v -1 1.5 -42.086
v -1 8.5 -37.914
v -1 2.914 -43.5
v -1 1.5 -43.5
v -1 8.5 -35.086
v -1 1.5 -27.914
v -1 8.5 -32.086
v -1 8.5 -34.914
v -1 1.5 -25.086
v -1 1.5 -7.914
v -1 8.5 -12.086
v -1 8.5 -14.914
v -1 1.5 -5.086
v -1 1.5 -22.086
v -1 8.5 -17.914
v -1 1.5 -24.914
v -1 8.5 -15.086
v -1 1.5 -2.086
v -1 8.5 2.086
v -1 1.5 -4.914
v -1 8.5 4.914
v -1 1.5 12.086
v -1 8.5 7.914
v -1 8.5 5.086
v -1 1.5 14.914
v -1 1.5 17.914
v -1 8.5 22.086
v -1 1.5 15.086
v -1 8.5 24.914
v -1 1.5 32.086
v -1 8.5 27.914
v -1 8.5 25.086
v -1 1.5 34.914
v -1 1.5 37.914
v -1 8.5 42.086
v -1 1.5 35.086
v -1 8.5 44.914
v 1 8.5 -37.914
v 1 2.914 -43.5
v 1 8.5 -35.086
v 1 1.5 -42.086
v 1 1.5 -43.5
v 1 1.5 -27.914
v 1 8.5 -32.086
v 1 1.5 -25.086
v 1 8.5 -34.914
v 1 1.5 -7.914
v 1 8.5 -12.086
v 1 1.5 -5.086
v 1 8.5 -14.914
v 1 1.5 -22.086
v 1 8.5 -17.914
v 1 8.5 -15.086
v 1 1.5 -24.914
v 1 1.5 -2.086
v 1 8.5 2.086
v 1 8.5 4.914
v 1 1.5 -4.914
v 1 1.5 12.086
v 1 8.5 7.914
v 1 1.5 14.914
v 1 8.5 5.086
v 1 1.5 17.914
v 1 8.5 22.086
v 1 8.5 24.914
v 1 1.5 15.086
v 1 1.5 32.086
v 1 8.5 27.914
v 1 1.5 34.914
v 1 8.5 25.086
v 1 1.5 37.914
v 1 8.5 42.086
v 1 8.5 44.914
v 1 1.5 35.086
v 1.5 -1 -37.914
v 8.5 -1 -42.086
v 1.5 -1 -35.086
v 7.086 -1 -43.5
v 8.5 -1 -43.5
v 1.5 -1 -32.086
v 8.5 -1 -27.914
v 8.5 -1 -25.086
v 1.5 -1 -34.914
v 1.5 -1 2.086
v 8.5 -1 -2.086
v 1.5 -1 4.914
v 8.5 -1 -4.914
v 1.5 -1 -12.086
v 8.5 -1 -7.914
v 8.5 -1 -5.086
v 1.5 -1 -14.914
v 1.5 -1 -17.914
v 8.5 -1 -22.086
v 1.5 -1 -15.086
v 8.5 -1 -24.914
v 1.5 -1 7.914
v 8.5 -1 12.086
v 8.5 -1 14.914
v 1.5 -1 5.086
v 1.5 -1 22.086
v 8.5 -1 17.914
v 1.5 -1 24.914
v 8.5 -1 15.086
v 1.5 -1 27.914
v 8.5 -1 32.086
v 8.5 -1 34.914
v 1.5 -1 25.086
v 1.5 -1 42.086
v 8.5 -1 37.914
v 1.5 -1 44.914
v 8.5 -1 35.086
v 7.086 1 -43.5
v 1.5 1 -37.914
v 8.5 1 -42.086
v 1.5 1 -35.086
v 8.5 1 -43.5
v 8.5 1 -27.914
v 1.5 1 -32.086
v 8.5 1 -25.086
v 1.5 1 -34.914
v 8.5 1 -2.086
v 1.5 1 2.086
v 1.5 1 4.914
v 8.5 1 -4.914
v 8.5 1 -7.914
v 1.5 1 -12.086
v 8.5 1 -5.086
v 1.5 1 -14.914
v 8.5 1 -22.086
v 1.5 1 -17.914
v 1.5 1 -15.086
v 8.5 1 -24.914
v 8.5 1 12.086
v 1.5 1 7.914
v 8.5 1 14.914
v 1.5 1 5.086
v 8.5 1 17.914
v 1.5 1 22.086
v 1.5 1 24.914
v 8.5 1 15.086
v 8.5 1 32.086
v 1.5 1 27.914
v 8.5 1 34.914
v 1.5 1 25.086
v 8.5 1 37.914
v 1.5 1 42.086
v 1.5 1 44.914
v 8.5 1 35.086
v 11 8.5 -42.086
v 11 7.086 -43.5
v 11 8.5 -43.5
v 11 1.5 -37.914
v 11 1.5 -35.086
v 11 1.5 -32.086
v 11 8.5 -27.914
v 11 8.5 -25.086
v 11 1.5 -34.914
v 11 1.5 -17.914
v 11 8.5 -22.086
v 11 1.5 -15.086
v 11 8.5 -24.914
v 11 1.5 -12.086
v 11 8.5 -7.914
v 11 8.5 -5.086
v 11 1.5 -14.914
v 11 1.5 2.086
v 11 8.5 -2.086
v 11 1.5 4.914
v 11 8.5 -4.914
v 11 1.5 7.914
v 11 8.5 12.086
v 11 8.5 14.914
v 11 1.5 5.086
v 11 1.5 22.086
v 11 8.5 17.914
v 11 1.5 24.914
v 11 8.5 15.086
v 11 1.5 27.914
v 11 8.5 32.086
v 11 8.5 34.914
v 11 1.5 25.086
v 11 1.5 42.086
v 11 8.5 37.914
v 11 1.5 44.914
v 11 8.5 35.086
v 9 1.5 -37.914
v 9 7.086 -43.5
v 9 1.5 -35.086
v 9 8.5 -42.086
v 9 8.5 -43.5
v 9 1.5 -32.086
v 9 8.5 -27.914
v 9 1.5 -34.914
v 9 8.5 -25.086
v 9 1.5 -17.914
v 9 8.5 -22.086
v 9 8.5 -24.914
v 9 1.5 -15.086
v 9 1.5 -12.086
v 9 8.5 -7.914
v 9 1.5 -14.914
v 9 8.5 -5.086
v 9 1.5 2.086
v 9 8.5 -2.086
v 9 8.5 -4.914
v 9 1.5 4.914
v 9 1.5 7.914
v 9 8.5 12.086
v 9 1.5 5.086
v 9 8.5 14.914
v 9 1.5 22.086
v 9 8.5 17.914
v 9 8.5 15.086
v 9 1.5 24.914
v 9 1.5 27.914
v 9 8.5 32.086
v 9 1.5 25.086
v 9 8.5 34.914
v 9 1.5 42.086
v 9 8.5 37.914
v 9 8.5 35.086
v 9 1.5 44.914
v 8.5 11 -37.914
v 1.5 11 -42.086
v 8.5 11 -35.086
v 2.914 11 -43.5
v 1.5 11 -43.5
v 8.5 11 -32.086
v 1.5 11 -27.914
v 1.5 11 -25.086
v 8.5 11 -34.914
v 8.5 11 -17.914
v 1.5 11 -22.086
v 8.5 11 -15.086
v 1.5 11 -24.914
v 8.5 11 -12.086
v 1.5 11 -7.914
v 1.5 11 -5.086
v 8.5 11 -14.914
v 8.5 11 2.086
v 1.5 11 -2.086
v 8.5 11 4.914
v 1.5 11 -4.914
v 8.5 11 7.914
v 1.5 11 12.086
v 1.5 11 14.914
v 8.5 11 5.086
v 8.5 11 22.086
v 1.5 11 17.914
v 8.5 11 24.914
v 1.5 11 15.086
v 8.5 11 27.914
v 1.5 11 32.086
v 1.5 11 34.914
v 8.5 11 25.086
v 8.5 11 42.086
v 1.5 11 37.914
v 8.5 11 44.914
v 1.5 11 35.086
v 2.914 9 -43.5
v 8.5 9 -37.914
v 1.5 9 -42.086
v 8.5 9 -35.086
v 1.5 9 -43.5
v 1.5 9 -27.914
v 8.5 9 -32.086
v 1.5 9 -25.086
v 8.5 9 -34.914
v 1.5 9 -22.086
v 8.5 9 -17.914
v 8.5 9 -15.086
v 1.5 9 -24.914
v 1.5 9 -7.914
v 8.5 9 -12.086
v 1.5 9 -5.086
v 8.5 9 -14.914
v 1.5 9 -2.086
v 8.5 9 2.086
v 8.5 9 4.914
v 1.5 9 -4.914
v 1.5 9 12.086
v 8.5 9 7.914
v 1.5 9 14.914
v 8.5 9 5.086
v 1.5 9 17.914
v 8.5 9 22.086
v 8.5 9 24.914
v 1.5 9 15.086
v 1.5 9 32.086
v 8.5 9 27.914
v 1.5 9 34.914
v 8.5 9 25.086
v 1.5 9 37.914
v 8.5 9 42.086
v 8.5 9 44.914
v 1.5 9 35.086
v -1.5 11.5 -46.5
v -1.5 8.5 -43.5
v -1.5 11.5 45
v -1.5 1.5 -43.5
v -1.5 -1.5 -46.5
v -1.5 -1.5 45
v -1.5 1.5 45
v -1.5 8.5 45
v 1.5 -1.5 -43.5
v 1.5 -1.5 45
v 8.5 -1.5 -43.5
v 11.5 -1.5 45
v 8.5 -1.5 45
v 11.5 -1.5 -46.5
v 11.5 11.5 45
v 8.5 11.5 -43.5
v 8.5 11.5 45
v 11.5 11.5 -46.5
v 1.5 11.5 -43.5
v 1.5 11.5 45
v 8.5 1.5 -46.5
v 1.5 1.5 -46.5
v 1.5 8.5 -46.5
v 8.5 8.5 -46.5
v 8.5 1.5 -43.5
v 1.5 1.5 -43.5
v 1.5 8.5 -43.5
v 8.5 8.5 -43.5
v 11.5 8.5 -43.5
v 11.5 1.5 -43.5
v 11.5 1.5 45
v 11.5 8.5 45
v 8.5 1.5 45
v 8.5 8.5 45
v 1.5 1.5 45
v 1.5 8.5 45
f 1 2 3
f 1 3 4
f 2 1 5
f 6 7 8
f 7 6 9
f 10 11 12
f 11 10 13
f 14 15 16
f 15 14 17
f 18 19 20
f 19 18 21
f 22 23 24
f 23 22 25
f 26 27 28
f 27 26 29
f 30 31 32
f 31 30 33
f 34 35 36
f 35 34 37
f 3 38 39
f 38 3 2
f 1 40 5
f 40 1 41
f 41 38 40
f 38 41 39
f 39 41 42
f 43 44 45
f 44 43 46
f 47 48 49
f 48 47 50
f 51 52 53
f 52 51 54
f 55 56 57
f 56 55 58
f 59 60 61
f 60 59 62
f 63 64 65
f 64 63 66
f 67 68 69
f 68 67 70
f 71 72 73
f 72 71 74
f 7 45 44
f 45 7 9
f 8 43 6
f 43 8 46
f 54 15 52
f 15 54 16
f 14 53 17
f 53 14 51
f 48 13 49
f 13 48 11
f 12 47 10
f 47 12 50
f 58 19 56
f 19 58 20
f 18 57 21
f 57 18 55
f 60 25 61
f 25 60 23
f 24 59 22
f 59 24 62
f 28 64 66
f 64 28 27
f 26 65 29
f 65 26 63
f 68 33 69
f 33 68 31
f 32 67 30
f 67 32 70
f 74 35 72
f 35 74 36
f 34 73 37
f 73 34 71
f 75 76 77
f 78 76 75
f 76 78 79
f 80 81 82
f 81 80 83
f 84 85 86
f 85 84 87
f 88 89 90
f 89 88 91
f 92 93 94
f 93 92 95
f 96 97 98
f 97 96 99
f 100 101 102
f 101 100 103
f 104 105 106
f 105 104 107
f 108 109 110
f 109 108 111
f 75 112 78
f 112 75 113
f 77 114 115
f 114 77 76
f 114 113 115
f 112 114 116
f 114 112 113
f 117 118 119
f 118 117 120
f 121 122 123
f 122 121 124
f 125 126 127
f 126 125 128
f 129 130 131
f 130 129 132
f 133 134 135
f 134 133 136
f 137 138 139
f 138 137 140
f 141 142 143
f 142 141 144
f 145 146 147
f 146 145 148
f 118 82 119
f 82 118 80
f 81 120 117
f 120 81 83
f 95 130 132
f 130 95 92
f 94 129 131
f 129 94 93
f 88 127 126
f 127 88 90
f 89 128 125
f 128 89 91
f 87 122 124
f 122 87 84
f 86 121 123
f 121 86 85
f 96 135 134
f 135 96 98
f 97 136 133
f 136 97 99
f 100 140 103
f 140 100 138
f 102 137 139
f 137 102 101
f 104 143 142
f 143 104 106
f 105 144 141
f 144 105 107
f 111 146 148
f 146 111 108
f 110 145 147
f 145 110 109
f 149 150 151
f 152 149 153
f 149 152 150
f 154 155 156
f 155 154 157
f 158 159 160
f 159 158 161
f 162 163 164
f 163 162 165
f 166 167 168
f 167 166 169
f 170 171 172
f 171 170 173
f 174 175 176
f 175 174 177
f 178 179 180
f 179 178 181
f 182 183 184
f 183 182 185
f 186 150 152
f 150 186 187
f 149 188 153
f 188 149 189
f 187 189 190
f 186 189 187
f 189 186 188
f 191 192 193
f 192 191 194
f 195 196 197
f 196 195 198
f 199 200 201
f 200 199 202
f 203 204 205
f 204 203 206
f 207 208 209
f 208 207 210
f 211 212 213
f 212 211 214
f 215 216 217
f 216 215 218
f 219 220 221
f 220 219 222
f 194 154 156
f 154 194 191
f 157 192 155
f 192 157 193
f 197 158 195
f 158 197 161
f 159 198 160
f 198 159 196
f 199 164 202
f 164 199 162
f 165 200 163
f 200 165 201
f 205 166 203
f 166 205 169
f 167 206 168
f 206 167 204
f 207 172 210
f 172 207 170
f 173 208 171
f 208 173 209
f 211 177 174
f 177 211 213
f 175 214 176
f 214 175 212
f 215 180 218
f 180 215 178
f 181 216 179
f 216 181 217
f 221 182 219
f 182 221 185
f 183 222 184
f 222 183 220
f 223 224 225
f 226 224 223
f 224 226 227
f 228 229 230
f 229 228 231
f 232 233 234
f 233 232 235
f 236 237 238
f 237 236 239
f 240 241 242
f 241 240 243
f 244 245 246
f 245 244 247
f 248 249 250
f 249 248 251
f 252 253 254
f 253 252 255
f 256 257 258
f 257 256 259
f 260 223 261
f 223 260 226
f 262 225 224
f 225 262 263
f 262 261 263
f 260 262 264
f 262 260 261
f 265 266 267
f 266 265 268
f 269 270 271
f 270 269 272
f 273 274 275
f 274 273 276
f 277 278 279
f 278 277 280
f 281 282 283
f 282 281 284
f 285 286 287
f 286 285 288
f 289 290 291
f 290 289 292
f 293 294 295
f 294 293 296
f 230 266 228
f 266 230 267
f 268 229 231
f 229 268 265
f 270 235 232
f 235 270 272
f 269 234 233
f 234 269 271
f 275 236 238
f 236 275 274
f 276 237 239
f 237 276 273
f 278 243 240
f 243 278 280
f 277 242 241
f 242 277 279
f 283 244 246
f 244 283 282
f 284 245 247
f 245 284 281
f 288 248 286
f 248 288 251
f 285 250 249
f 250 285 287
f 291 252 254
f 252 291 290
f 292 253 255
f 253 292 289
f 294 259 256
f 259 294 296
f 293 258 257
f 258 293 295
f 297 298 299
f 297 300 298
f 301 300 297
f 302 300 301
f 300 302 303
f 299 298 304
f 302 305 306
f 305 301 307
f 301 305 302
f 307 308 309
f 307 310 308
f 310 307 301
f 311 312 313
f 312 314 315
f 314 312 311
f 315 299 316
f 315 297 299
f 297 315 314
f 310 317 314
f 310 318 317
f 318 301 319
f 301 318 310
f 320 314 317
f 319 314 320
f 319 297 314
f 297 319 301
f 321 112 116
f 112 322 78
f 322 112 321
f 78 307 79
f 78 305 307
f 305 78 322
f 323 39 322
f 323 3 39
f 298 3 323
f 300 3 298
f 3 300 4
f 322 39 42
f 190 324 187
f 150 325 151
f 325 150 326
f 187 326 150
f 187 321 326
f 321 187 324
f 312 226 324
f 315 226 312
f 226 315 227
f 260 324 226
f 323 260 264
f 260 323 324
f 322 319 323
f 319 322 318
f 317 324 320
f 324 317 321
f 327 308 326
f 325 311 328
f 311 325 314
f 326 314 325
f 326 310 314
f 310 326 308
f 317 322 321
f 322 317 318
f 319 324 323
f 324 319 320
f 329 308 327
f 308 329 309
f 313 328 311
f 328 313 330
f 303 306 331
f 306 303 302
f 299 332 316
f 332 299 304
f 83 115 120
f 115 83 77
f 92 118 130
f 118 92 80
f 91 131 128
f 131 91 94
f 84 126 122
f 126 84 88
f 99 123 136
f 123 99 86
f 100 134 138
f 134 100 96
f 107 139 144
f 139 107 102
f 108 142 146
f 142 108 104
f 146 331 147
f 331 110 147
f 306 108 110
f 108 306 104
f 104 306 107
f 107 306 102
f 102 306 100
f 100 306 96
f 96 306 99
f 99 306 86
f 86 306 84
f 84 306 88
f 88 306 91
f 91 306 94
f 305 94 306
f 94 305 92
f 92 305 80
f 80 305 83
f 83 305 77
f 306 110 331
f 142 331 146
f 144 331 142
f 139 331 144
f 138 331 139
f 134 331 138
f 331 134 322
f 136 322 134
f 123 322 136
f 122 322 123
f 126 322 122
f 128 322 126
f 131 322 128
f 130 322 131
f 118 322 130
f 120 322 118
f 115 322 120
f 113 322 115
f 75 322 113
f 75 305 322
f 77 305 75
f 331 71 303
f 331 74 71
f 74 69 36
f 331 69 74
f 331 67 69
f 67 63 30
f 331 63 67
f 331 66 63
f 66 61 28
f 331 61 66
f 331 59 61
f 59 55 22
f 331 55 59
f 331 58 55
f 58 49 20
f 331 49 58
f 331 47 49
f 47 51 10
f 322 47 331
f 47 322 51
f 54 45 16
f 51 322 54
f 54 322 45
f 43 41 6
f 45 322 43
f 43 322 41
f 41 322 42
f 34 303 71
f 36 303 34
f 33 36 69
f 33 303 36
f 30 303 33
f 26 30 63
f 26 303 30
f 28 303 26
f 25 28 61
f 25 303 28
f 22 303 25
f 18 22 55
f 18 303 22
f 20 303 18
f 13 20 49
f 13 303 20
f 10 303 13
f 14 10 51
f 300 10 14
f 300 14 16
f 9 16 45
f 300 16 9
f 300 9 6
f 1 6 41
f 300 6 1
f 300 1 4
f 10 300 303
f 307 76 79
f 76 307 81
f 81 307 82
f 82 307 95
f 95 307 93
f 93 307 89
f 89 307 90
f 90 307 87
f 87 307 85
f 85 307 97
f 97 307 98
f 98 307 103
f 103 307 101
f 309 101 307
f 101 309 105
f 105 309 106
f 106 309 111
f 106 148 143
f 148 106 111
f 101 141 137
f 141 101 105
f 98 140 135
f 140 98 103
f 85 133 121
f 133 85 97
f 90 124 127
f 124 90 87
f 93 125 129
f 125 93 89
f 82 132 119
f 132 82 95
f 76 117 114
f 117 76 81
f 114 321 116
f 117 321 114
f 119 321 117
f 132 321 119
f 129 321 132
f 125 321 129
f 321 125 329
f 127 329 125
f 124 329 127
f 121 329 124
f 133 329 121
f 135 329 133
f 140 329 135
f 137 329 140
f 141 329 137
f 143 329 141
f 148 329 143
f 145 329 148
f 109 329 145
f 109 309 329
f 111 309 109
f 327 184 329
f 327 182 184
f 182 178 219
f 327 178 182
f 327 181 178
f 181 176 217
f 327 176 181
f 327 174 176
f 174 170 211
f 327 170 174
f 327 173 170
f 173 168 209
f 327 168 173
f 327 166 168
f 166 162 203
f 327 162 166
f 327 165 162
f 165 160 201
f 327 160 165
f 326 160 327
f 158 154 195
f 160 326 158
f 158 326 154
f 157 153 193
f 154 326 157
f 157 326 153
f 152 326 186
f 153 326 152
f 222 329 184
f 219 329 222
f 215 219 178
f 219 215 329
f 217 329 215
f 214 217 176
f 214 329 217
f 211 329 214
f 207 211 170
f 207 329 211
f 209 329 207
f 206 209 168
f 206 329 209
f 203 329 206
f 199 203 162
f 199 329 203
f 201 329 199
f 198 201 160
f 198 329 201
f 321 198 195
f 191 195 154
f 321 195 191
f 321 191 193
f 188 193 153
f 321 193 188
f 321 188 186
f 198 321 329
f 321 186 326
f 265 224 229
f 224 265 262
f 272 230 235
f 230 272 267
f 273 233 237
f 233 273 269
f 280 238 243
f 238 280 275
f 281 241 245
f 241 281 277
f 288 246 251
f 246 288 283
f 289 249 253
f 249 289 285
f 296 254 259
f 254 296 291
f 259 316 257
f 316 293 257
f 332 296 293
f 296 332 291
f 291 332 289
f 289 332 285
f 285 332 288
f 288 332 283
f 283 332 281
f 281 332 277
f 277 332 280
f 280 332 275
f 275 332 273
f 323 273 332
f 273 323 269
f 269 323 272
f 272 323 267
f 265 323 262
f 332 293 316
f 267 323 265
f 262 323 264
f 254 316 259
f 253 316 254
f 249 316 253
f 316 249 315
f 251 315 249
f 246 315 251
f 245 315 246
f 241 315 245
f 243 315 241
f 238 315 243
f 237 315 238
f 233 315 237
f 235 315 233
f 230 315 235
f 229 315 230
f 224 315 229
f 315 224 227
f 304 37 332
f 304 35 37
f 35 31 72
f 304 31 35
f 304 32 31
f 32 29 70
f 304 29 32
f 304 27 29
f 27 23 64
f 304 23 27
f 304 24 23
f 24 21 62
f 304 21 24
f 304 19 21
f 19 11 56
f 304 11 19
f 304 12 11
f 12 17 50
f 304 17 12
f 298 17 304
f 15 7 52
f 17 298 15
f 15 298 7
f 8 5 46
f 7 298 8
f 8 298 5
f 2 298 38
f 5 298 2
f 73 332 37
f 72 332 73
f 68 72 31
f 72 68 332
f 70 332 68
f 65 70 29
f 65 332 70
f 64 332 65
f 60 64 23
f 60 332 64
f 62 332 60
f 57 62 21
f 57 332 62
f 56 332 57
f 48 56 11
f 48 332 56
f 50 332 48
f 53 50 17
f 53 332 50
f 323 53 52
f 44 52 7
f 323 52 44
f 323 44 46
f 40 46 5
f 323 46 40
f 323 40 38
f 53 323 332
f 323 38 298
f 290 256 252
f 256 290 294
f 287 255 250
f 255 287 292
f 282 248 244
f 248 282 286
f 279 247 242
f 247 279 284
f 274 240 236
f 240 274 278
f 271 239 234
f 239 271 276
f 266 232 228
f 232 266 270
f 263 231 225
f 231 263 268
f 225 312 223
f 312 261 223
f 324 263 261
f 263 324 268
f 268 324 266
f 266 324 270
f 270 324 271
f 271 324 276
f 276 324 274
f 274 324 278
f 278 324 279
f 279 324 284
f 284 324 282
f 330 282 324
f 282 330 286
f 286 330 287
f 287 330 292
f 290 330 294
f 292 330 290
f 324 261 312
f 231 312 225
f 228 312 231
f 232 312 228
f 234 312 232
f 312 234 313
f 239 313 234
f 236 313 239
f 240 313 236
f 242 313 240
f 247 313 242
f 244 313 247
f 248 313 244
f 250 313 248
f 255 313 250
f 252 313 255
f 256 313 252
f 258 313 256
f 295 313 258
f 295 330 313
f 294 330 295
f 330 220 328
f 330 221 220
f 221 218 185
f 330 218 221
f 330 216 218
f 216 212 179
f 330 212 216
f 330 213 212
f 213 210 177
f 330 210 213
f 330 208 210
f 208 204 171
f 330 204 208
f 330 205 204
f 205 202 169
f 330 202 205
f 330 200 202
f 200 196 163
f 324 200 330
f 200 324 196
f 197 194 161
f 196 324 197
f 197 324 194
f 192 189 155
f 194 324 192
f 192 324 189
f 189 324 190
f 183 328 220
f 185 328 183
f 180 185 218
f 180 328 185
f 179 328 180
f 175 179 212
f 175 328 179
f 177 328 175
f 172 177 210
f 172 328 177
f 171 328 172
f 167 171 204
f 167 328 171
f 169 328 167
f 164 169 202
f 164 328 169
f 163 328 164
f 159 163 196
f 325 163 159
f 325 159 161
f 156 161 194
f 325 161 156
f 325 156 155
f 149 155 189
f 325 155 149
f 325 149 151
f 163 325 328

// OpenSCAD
dist_x = 10;
dist_y = 10;
height = 90;
beam_dim = 2;
length_beam = sqrt((dist_x * dist_x) + (dist_y * dist_y));
outerbeam_dim = 3;

cube(size = [outerbeam_dim, outerbeam_dim, height], center = true);
translate([dist_x, 0, 0]) 
cube(size = [outerbeam_dim, outerbeam_dim, height], center = true);
translate([0, dist_y, 0]) 
cube(size = [outerbeam_dim, outerbeam_dim, height], center = true);
translate([dist_x, dist_y, 0]) 
cube(size = [outerbeam_dim, outerbeam_dim, height], center = true);

x = [0, 10, 10, 0];
y = [0, 0, 10, 10];
j = [90, 180, 270, 360];
colors = ["red", "blue", "green", "yellow"];
difference() {
    union() {
        for(k = [0:3]) {
            color(colors[k])
            translate([x[k], y[k], (height / -2) + dist_y / 2])
            rotate([0, 0, j[k]])
            for(i = [0:10:80]) {
                num = i / 10;
                rotation = num % 2 == 0 ? 45 : -45; 
                translate([dist_x / 2, 0, i]) 
                rotate([0, rotation, 0])
                cube(size = [beam_dim, beam_dim, length_beam], center = true);
            }
        }
    }
    
    translate([0, 0, height + 1.5])
    union() {
        translate([0, dist_y / 2, height / -2])
        rotate([90, 0, 0])
        cube(size =[outerbeam_dim, outerbeam_dim, dist_x + 3], center = true);

        translate([dist_x, dist_y / 2, height / -2])
        rotate([90, 0, 0])
        cube(size =[outerbeam_dim, outerbeam_dim, dist_x + 3], center = true);

        translate([dist_x / 2, 0, height / -2])
        rotate([90, 90, 90])
        cube(size =[outerbeam_dim, outerbeam_dim, dist_x + 3], center = true);

        translate([dist_x / 2, dist_y, height / -2])
        rotate([90, 90, 90])
        cube(size =[outerbeam_dim, outerbeam_dim, dist_x + 3], center = true);
    }
}

union() {
    translate([0, dist_y / 2, height / -2])
    rotate([90, 0, 0])
    cube(size =[outerbeam_dim, outerbeam_dim, dist_x + 3], center = true);

    translate([dist_x, dist_y / 2, height / -2])
    rotate([90, 0, 0])
    cube(size =[outerbeam_dim, outerbeam_dim, dist_x + 3], center = true);

    translate([dist_x / 2, 0, height / -2])
    rotate([90, 90, 90])
    cube(size =[outerbeam_dim, outerbeam_dim, dist_x + 3], center = true);

    translate([dist_x / 2, dist_y, height / -2])
    rotate([90, 90, 90])
    cube(size =[outerbeam_dim, outerbeam_dim, dist_x + 3], center = true);
}
